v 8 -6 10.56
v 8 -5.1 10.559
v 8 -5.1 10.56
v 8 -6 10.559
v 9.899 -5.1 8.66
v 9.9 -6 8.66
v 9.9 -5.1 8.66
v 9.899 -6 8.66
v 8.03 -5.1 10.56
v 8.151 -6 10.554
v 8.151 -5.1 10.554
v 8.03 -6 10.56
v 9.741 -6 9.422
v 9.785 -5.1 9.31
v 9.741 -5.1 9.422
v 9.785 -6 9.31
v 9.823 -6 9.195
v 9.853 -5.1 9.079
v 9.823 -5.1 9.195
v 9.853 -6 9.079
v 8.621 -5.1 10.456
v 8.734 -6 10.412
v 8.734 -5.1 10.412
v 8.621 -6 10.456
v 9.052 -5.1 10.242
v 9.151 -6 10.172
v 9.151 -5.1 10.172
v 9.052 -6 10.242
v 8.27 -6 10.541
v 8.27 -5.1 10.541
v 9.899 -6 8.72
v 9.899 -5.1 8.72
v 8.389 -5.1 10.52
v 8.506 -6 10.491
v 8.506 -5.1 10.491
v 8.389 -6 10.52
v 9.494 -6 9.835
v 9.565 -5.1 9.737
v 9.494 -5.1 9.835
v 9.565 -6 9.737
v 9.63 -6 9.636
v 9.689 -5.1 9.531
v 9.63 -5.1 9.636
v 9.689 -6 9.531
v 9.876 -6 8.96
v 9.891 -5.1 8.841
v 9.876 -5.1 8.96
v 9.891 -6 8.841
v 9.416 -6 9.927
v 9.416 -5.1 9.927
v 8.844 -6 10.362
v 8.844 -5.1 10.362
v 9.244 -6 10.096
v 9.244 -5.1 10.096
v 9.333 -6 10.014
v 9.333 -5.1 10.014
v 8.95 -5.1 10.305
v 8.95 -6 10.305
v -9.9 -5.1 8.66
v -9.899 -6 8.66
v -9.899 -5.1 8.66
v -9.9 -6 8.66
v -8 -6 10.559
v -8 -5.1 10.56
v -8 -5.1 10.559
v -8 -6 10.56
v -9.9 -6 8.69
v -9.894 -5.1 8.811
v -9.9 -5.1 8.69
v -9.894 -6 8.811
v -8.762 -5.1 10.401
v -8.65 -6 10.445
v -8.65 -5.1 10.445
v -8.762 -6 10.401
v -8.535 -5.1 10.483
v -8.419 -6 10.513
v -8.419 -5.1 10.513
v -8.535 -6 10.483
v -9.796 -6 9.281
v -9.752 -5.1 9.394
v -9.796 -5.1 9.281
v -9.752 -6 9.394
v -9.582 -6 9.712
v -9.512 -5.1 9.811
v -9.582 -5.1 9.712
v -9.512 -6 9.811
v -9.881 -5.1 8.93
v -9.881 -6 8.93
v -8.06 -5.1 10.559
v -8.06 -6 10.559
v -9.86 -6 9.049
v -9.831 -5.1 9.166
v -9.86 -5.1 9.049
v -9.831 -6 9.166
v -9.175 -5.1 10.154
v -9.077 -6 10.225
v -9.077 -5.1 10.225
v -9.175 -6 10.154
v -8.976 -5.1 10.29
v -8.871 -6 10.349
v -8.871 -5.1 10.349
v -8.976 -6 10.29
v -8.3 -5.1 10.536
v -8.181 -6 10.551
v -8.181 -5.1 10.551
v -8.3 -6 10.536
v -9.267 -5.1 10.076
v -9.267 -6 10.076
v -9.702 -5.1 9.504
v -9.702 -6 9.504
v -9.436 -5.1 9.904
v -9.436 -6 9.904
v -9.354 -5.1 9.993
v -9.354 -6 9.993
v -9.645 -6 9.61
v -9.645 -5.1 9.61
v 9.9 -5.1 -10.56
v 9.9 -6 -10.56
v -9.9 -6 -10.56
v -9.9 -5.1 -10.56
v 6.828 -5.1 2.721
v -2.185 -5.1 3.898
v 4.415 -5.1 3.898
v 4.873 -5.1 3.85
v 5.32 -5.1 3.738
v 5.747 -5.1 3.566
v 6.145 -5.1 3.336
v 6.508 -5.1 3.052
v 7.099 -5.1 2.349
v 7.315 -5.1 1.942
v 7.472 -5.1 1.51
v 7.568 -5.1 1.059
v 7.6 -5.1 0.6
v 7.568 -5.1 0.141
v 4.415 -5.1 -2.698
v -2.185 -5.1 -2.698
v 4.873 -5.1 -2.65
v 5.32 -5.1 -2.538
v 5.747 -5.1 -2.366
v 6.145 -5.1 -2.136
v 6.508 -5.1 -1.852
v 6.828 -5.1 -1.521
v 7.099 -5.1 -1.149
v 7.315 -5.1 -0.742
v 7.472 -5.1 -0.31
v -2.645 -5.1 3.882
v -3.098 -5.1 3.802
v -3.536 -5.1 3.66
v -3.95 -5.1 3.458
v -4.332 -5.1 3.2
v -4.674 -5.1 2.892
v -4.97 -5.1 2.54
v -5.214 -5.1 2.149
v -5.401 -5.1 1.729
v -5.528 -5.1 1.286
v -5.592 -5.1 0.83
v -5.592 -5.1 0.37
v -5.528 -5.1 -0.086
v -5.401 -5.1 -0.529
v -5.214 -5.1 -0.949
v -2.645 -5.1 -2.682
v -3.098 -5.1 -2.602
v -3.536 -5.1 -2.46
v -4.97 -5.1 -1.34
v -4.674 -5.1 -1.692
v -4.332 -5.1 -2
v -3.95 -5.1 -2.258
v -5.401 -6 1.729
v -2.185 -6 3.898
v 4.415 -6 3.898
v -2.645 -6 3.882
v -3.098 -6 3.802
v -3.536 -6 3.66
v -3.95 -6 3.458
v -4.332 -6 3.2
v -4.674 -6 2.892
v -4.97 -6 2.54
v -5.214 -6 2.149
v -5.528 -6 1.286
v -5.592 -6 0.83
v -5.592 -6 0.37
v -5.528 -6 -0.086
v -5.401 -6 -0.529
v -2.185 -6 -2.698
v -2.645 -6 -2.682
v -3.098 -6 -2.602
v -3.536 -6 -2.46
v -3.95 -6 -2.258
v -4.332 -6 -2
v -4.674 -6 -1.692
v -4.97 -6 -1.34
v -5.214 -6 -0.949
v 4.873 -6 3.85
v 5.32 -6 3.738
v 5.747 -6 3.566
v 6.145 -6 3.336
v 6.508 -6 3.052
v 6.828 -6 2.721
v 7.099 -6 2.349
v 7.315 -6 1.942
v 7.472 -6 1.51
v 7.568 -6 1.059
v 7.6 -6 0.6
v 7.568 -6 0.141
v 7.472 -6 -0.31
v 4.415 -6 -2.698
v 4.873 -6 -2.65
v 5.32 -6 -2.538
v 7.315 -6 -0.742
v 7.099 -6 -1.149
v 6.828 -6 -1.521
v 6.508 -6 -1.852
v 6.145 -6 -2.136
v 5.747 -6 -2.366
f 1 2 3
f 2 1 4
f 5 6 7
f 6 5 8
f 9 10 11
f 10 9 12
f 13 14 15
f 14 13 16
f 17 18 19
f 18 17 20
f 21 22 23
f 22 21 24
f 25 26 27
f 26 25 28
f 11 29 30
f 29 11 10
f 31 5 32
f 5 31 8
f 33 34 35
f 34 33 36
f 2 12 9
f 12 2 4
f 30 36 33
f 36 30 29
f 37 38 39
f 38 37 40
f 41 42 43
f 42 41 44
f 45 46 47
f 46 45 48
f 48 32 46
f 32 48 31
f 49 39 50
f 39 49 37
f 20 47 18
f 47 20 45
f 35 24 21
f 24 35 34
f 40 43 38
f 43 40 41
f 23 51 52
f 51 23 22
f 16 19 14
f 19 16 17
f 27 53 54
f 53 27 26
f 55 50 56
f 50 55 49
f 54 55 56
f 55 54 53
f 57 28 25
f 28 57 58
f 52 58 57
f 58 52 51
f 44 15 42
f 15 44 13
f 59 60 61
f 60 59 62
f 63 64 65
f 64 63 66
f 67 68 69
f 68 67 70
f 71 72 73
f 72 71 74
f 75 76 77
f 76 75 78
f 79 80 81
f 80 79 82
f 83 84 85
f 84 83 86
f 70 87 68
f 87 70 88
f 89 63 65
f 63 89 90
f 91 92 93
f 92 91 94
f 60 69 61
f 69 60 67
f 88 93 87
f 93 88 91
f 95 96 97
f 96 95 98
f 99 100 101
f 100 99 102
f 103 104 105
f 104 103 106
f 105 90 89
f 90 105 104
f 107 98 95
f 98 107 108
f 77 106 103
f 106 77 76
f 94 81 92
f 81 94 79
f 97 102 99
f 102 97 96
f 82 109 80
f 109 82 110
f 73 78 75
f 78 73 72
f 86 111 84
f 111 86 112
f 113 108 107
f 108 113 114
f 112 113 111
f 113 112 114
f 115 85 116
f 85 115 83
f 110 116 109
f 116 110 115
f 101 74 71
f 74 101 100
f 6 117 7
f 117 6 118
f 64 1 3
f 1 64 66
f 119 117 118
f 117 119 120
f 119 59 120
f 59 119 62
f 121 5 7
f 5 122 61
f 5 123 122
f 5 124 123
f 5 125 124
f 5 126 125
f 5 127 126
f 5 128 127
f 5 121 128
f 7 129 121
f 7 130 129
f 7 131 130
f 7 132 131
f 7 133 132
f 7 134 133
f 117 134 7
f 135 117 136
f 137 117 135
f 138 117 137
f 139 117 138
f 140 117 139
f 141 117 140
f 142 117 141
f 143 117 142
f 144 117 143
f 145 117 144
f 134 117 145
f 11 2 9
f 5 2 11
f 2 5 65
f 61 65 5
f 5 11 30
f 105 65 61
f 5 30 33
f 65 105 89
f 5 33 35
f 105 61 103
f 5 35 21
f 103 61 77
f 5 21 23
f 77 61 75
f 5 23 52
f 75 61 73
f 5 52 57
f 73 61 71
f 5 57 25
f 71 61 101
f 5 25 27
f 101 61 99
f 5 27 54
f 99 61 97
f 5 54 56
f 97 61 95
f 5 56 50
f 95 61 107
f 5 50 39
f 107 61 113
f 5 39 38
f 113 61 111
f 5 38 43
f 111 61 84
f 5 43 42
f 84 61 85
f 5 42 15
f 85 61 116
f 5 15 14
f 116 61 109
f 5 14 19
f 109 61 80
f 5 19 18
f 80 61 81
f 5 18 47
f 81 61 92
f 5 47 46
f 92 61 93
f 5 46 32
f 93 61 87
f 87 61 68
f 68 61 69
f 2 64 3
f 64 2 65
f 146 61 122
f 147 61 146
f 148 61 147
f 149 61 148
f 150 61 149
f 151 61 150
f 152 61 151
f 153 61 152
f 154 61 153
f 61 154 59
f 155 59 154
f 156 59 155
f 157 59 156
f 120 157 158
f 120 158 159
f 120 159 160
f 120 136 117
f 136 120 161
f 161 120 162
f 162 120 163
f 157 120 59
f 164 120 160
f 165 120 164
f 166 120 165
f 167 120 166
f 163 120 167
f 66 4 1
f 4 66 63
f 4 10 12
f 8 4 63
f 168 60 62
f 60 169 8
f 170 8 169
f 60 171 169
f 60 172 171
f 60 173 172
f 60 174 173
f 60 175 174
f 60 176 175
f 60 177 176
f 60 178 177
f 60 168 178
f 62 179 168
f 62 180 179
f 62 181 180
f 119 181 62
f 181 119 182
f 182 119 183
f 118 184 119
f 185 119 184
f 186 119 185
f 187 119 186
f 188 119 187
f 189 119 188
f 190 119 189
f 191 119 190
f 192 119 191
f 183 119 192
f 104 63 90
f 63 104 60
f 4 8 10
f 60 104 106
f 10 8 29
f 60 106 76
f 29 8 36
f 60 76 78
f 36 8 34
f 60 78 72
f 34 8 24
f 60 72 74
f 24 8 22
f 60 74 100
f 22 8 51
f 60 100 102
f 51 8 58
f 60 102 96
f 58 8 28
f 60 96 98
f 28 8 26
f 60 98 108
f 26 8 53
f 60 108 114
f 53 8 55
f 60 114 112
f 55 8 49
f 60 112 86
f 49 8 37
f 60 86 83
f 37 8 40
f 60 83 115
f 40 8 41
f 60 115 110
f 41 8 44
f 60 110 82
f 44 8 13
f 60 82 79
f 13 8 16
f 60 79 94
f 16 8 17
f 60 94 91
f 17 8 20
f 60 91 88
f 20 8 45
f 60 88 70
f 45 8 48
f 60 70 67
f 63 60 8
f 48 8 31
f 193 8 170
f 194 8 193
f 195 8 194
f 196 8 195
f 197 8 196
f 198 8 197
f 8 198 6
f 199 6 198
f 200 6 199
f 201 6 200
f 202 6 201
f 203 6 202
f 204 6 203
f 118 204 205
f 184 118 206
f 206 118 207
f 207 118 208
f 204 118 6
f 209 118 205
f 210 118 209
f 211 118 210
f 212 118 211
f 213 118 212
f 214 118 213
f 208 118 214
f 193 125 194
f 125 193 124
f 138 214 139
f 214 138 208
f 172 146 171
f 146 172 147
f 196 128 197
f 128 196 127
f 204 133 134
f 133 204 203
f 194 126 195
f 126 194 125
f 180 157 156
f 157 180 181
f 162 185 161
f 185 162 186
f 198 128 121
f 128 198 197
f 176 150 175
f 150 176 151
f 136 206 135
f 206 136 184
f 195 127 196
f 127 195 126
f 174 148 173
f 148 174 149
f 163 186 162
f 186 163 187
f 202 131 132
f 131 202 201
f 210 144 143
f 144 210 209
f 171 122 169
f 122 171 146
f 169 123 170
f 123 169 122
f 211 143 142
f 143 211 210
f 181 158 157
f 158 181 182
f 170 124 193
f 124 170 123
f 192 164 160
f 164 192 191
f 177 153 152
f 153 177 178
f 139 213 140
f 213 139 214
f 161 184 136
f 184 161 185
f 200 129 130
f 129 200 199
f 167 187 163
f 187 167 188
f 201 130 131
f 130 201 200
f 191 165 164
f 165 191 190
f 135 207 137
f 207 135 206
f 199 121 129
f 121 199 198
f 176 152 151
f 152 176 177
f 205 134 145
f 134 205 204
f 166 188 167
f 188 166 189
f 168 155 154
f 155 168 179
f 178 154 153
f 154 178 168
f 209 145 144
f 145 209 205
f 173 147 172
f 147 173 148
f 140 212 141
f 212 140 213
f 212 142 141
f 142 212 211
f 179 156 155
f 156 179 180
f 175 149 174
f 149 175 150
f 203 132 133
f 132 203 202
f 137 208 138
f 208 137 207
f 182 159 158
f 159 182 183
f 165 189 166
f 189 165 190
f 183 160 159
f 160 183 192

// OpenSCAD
// file: rounder.scad
// rounder.scad
// cutting tool for rounding off corners with a cylinder

//---------------------
module rounder(
r=10,   // radius
h=10,   // height
f=22,    // $fn
extra=0.01  // extra size for the cube
){

difference(){
  translate([-extra,-extra,-extra])
  cube([r+extra,r+extra,h+2*extra]);
  translate([r,r,-1])
  cylinder(r=r,h=h+2,$fn=f);
}

}

//---------------------------------------------------------------------------
module bevel(x=1,y=1,h=10){

linear_extrude(height=h)
polygon(points=[[0,0],[x,0],[0,y]]);
    
}
  

//========================

rounder();

//========================
// file: tslot.scad
//=================================================================================
// tslot
// models for tslots used in PrusaDusa
// 
// Tom Flint, 2020
//=================================================================================
module tslot1(
tol = 0.0,
len = 60,
type = 1
){
    
// 30x30     
if(type==1){
    linear_extrude(height=len,convexity=10)
    difference(){
        offset(r=2.0+tol,$fn=20)
        square([26,26],center=true);
 
        translate([0,12,0])
        square([8.2-tol,8.2-tol],center=true);
        translate([0,-12,0])
        square([8.2-tol,8.2-tol],center=true);
        translate([12,0,0])
        square([8.2-tol,8.2-tol],center=true);
        translate([-12,0,0])
        square([8.2-tol,8.2-tol],center=true);
    }
}
    
// 30x60
if(type==2){
    linear_extrude(height=len,convexity=10)
    difference(){
        offset(r=2.0+tol,$fn=20)
        square([26,56],center=true);
 
        translate([0,27,0])
        square([8.2-tol,8.2-tol],center=true);
        translate([0,-27,0])
        square([8.2-tol,8.2-tol],center=true);
        
        translate([12,15,0])
        square([8.2-tol,8.2-tol],center=true);
        translate([-12,15,0])
        square([8.2-tol,8.2-tol],center=true);

        translate([12,-15,0])
        square([8.2-tol,8.2-tol],center=true);
        translate([-12,-15,0])
        square([8.2-tol,8.2-tol],center=true);
    }
}
    
// 36x60
if(type==3){
    linear_extrude(height=len,convexity=10)
    difference(){
        offset(r=2.0+tol,$fn=20)
        square([56,56],center=true);
 
        translate([15,27,0])
        square([8.2-tol,8.2-tol],center=true);
        translate([15,-27,0])
        square([8.2-tol,8.2-tol],center=true);
        
        translate([-15,27,0])
        square([8.2-tol,8.2-tol],center=true);
        translate([-15,-27,0])
        square([8.2-tol,8.2-tol],center=true);
        
        translate([27,15,0])
        square([8.2-tol,8.2-tol],center=true);
        translate([-27,15,0])
        square([8.2-tol,8.2-tol],center=true);

        translate([27,-15,0])
        square([8.2-tol,8.2-tol],center=true);
        translate([-27,-15,0])
        square([8.2-tol,8.2-tol],center=true);
    }
}
    
}

//--------------------------------------
module tbrace(
tol=0.0
){

F2=22;
 
translate([0,0,2-15])    
difference(){    
union(){
        cube([4.8,60,26]);
        cube([60,4.8,26]);
    
    hull(){
        translate([60-2.4,4.8,0])
        cylinder(r=2.4,h=26,$fn=F2);
        translate([4.8,60-2.4,0])
        cylinder(r=2.4,h=26,$fn=F2);
    }
}    

        translate([15,0,26/2])
        rotate([-90,0,0])
        cylinder(r1=3.5,r2=4.5,h=60,$fn=F2);
        translate([15+30,0,26/2])
        rotate([-90,0,0])
        cylinder(r1=3.5,r2=4.5,h=60,$fn=F2);

        translate([0,15,26/2])
        rotate([0,90,0])
        cylinder(r1=3.5,r2=4.5,h=60,$fn=F2);
        translate([0,15+30,26/2])
        rotate([0,90,0])
        cylinder(r1=3.5,r2=4.5,h=60,$fn=F2);

}
}

//----------------------------------------
module lbrace(
tol=0,
holes=0,
nuts=1
){

F2=22;
    
pts1=[ [5,0], [80,0], [85,5], [85,22], [80,28],
    [28,28], [28,80], [22,85], [5,85], [0,80], [0,5] ];
    
if(holes==1){
    difference(){
        linear_extrude(height=3.25+tol,convexity=10)
        offset(r=tol)
        polygon(points=pts1);
        
        translate([16+30,14,-1])
        cylinder(r=3.25,h=5,$fn=F2);
        translate([16+60,14,-1])
        cylinder(r=3.25,h=5,$fn=F2);

        translate([14,16+30,-1])
        cylinder(r=3.25,h=5,$fn=F2);
        translate([14,16+60,-1])
        cylinder(r=3.25,h=5,$fn=F2);
    }
}else{
        linear_extrude(height=3.25+tol,convexity=10)
        offset(r=tol)
        polygon(points=pts1);
}

if(nuts==1){
    
        translate([16+30,14,0])
        cylinder(r=5,h=6+3.25,$fn=F2);
        translate([16+60,14,0])
        cylinder(r=5,h=6+3.25,$fn=F2);

        translate([14,16+30,0])
        cylinder(r=5,h=6+3.25,$fn=F2);
        translate([14,16+60,0])
        cylinder(r=5,h=6+3.25,$fn=F2);
}

}


//=======================================

lbrace();

translate([50,50,0])
lbrace(tol=0.2);

//tbrace();

/*
color("cyan")
tslot1(len=70);

color("green")
translate([0,15,0])
tslot1(type=2);

color("red")
translate([15,15,0])
tslot1(type=3,len=50);

*/

//=======================================
// main file
//=================================================================================
// lems.scad
// fixtures for LEM current sensors
//
// Dr Tom Flint, 30 April 2021
// add new LEM cases to allow use of 12 AWG wiring, 18 Nov 2021
//
//=================================================================================


use <../Parts/tslot.scad>
use <../Parts/rounder.scad>


//---------------------------------------------------------------------------------
module lem15(){

difference(){
  cube([13.4,23.7,22.0]);
 
  translate([-0.1,-0.01,-0.01])
  cube([1.1,17,14.5]);  
  translate([12.4,-0.01,-0.01])
  cube([1.1,17,14.5]);

  translate([0,14,11.4])
  rotate([0,90,0])
  cylinder(r=1.6,h=20);
  
  translate([-1,23.7,22.0])
  rotate([0,90,0])
  rotate([0,0,-90])
  rounder(r=1.6,h=20,f=89);
  
  translate([-1,0,22.0])
  rotate([0,90,0])
  rounder(r=1.6,h=20,f=89);
  
}

 $fn=55;
 
 // power pins
 translate([0.5,9.2,-3.75])
 cylinder(r=0.5,h=8.5);
 translate([0.5,11.8,-3.75])
 cylinder(r=0.5,h=8.5);
 translate([0.5,14.2,-3.75])
 cylinder(r=0.5,h=8.5);

 translate([12.9,9.2,-3.75])
 cylinder(r=0.5,h=8.5);
 translate([12.9,11.8,-3.75])
 cylinder(r=0.5,h=8.5);
 translate([12.9,14.2,-3.75])
 cylinder(r=0.5,h=8.5);
 
  // attach the pins to the body
  translate([0,7,0])
  cube([1,8,3]);  
  translate([12.4,7,0])
  cube([1,8,3]);
 
  // signal pins
  for(i=[0:3]){
    translate([4+1.5*i,22.0,-3.75])
    cylinder(r=0.15,h=8.5);
  }
 
}

//-------------------------------------------------------------------------------
module lemPack3(){

rfoot=2;
fit=0.15;

  $fn=89;
  difference(){
  hull(){
    translate([rfoot,rfoot,0])
    cylinder(r1=rfoot,r2=rfoot,h=9);
    translate([rfoot,rfoot+13.4,0])
    cylinder(r1=rfoot,r2=rfoot,h=9);

    translate([rfoot+23.7*3+4,rfoot,0])
    cylinder(r1=rfoot,r2=rfoot,h=9);
    translate([rfoot+23.7*3+4,rfoot+13.4,0])
    cylinder(r1=rfoot,r2=rfoot,h=9);
  }


  for(i=[0:2]){
    translate([3+(23.7+2)*i-fit/2,2-fit/2,1.8]){
    cube([22.0+fit,13.4+fit,20]);
    hull(){
    translate([23.7*0.3,13.4/2,0])
    cylinder(r=4,h=10,center=true);
    translate([23.7*0.7,13.4/2,0])
    cylinder(r=4,h=10,center=true);
  }
    }
  }
}

  difference(){
    translate([10,-21.7-1,0])
    cube([55.2+2,21.7+2,6.8+2]);

    translate([11,-21.7,2.1])
    cube([55.2,21.7,6.8]);
  }
  difference(){
    translate([10,17,0])
    cube([55.2+2,21.7+2,6.8+2]);

    translate([11,17,2.1])
    cube([55.2,21.7,6.8]);
  }

if(0){
  color("red")
  translate([40,1,4])
  rotate([84,0,0])
  linear_extrude(height=1,scale=1)
  text("Aero Amp", font = "Open Sans:style=Bold", size=5.5,halign="center",valign="center",spacing=1.1);
}

}
//-------------------------------
module lemcase3(){

  difference(){
    lemcase(round=0);
    translate([-10-1,8,21.32/2+1])
    rotate([90,0,0])
    rotate([0,0,-90])
    rounder(r=3,h=14.1,f=33);
  }
  translate([21,0,0])
  lemcase(round=0);
  difference(){
    translate([42,0,0])
    lemcase(round=0);
    translate([53,8,21.32/2+1])
    rotate([90,0,0])
    rotate([0,0,180])
    rounder(r=3,h=14.1,f=33);
  }
  
  
if(0){  
  difference(){  
    translate([-11,-5.5,23/2])
    cube([64,12,0.6]);
    
    color("red")
    translate([22,0,23/2])
    linear_extrude(height=0.6,scale=1)
    text("Aero Amp", font = "Open Sans:style=Bold", size=7,halign="center",valign="center",spacing=1.1);
  }
}

}
  
  
//---------------------------------------------------------------------------------
// replacement shell for the LEM15's which don't allow enough space to get a 12 awg 
// wire through the loop
module lemcase(round=1){

thick=1.0;

  // outer body
  difference(){
    translate([0,thick/2,0])
    cube([20.0+2*thick,11+1*thick,21.32+2*thick],center=true);

    if(round==1){
      translate([10+thick,6+thick,21.32/2+thick])
      rotate([90,0,0])
      rotate([0,0,180])
      rounder(r=2+thick,h=14,f=99);

      translate([-10-thick,6+thick,21.32/2+thick])
      rotate([90,0,0])
      rotate([0,0,-90])
      rounder(r=2+thick,h=14,f=99);
    }
    
    // bore for conductor
    translate([1,0,0.6])
    rotate([90,0,0])
    cylinder(r=5/2,h=15,center=true,$fn=45);
    
    // cut for pcb signal wires
    translate([-10,-6-thick/2,-21.32/2-thick-0.1])
    cube([2.8,12,3]);

    difference(){
      // main hole
      cube([20.0,11.1,21.32],center=true);
      translate([10,5,21.32/2])
      rotate([90,0,0])
      rotate([0,0,180])
      rounder(r=2,h=11.1,f=33);
      translate([-10,5,21.32/2])
      rotate([90,0,0])
      rotate([0,0,-90])
      rounder(r=2,h=11.1,f=33);

      // bottom right notches
      translate([10-0.5,0,-21.32/2+1.8])
      cube([1.0,11+2,0.73],center=true);
      translate([10-0.5,0,-21.32/2+1.5+2.2])
      cube([1.0,11+2,0.73],center=true);

      // left side notches
      translate([-10+3.0,0,-21.32/2])
      cube([0.55,11+2,0.45],center=true);
      translate([-10+5.25,0,21.32/2-0.4])
      cube([1.0,11+2,1.0],center=true);
      
      // right side isn't as deep
      translate([-4,3.75+1,-21.32/2])
      cube([14,1,25]);
      
      // bore for conductor
      translate([1,0,0.6])
      rotate([90,0,0])
      cylinder(r=5/2+0.8,h=15,center=true,$fn=45);
    }
  }  
}
//---------------------------------------------------------------------------------
// replacement shell for the LEM15's which don't allow enough space to get a 12 awg 
// wire through the loop
module lemcase2(round=1){

thick=1.0;

  // outer body
  difference(){
    translate([0,thick/2,0])
    cube([20.0+2*thick,12+1*thick,21.32+2*thick],center=true);

    if(round==1){
      translate([10+thick,6+thick,21.32/2+thick])
      rotate([90,0,0])
      rotate([0,0,180])
      rounder(r=2+thick,h=14,f=99);

      translate([-10-thick,6+thick,21.32/2+thick])
      rotate([90,0,0])
      rotate([0,0,-90])
      rounder(r=2+thick,h=14,f=99);
    }
    
    // bore for conductor
    translate([1,0,0.6])
    rotate([90,0,0])
    cylinder(r=5/2,h=15,center=true,$fn=45);
    
    // cut for pcb signal wires
    translate([-10,-6-thick/2,-21.32/2-thick-0.1])
    cube([2.8,12,3]);

    difference(){
      // main hole
      cube([20.0,12.1,21.32],center=true);
      translate([10,5,21.32/2])
      rotate([90,0,0])
      rotate([0,0,180])
      rounder(r=2,h=12.1,f=33);
      translate([-10,5,21.32/2])
      rotate([90,0,0])
      rotate([0,0,-90])
      rounder(r=2,h=12.1,f=33);

      // bottom right notches
      translate([10-0.5,0,-21.32/2+1.8])
      cube([1.0,8+2,0.73],center=true);
      translate([10-0.5,0,-21.32/2+1.5+2.2])
      cube([1.0,8+2,0.73],center=true);

      // left side notches
      translate([-10+3.0,0,-21.32/2])
      cube([0.55,8+2,0.45],center=true);
      translate([-10+5.25,0,21.32/2-0.4])
      cube([1.0,8+2,1.0],center=true);
      
      // right side isn't as deep
      translate([-4,3.75+1,-21.32/2])
      cube([14,1,25]);
      
      // bore for conductor
      translate([1,0,0.6])
      rotate([90,0,0])
      cylinder(r=5/2+0.8,h=15,center=true,$fn=45);
    }
  }  
}

//---------------------------------------------------------------------------------
// replacement shell for the LEM15's which don't allow enough space to get a 12 awg 
// wire through the loop
module lemlid2(round=1){

thick=-0.1;

  // outer body
  translate([0,-5.5,0])
  difference(){
    translate([0,thick/2,0])
    cube([20.0+2*thick,0.9,21.32+2*thick],center=true);

    if(round==1){
      translate([10+thick,6+thick,21.32/2+thick])
      rotate([90,0,0])
      rotate([0,0,180])
      rounder(r=2+thick,h=14,f=99);

      translate([-10-thick,6+thick,21.32/2+thick])
      rotate([90,0,0])
      rotate([0,0,-90])
      rounder(r=2+thick,h=14,f=99);
    }
    
    // bore for conductor
    translate([1,0,0.6])
    rotate([90,0,0])
    cylinder(r=5/2+1,h=15,center=true,$fn=45);
    
    // cut for pcb signal wires
    translate([-10,-6-thick/2,-21.32/2-thick-0.1])
    cube([2.8,12,3]);

  }  
}

//---------------------------------------------------------------------------------
// replacement shell for the LEM15's which don't allow enough space to get a 12 awg 
// wire through the loop
module lemcase4(round=1){

thick=1.0;

  // outer body
  difference(){
    translate([0,thick/2-0.5,0])
    cube([20.0+2*thick,12+1*thick+1,21.32+2*thick],center=true);

    if(round==1){
      translate([10+thick,6+thick,21.32/2+thick])
      rotate([90,0,0])
      rotate([0,0,180])
      rounder(r=2+thick,h=14,f=99);

      translate([-10-thick,6+thick,21.32/2+thick])
      rotate([90,0,0])
      rotate([0,0,-90])
      rounder(r=2+thick,h=14,f=99);
    }
    
    // bore for conductor
    hull(){
      translate([1+3.3,0,0.6])
      rotate([90,0,0])
      cylinder(r=5/2,h=15,center=true,$fn=45);
      translate([1-3.3,0,0.6])
      rotate([90,0,0])
      cylinder(r=5/2,h=15,center=true,$fn=45);
    }
    
    // cut for pcb signal wires
    translate([-10,-6-thick/2-0.5,-21.32/2-thick-0.1])
    cube([2.8,12+1,3]);

    difference(){
      // main hole
      translate([0,-0.5,0])
      cube([20.0,12.1+1,21.32],center=true);
      
      // top rounders
      translate([10,6,21.32/2])
      rotate([90,0,0])
      rotate([0,0,180])
      rounder(r=2,h=12.1+1,f=33);
      translate([-10,6,21.32/2])
      rotate([90,0,0])
      rotate([0,0,-90])
      rounder(r=2,h=12.1+1,f=33);

      // bottom right notches
      translate([10-0.5,0,-21.32/2+1.8])
      cube([1.0,8+3+1,0.73],center=true);
      translate([10-0.5,0,-21.32/2+1.5+2.2])
      cube([1.0,8+3+1,0.73],center=true);

      // left side notches
      translate([-10+3.0+3.5,0,-21.32/2])
      cube([0.73,8+3+1,1],center=true);
      translate([-10+5.5,0,21.32/2-0.4])
      cube([1.0,8+3+1,1.0],center=true);
      
      // right side isn't as deep
      translate([-4,3.75+1.5,-21.32/2])
      cube([14,1,25]);
      
      // bore for conductor
      hull(){
        translate([1+3.3,0,0.6])
        rotate([90,0,0])
        cylinder(r=5/2+0.6,h=15,center=true,$fn=45);
        translate([1-3.3,0,0.6])
        rotate([90,0,0])
        cylinder(r=5/2+0.6,h=15,center=true,$fn=45);
      }
    }
  }  
  
  // add strain relief 4-wire ribbon cable, 6x1.2 
  translate([-3,0,0]){
    difference(){
      translate([4,1.5,-(20.0+3*thick)/2])
      cube([6,12+1*thick+1-3,4.5],center=true);
    
      translate([0,thick/2-0.5,0])
      cube([20.0+2*thick,12+1*thick+1,21.32+2*thick],center=true);

      translate([0,thick/2-0.5-3,-(21.32+2*thick)/2-0.5])
      cube([20.0+2*thick,12+1*thick+1,1.2],center=true);
      
    }

    translate([2,thick+0.5,-(21.32+2*thick)/2-2.1])
    rotate([90,0,0])
    cylinder(r=thick,h=12+1*thick+1-3,center=true,$fn=77);
    translate([6,thick+0.5,-(21.32+2*thick)/2-2.1])
    rotate([90,0,0])
    cylinder(r=thick,h=12+1*thick+1-3,center=true,$fn=77);
  }
}

//---------------------------------------------------------------------------------
// replacement shell for the LEM15's which don't allow enough space to get a 12 awg 
// wire through the loop
module lemlid4(round=1){

thick=-0.1;

  // outer body
  translate([0,-5.5,0])
  difference(){
    translate([0,thick/2,0])
    cube([20.0+2*thick,0.9,21.32+2*thick],center=true);

    if(round==1){
      translate([10+thick,6+thick,21.32/2+thick])
      rotate([90,0,0])
      rotate([0,0,180])
      rounder(r=2+thick,h=14,f=99);

      translate([-10-thick,6+thick,21.32/2+thick])
      rotate([90,0,0])
      rotate([0,0,-90])
      rounder(r=2+thick,h=14,f=99);
    }
    
    // bore for conductor
    hull(){
      translate([1+3.3,0,0.6])
      rotate([90,0,0])
      cylinder(r=5/2+0.8,h=15,center=true,$fn=45);
      translate([1-3.3,0,0.6])
      rotate([90,0,0])
      cylinder(r=5/2+0.8,h=15,center=true,$fn=45);
    }

  }  
}

//=================================================================================

//color("red",alpha=0.7)
//lemcase();

//color("red")
//lemcase4();
//translate([0,-1,0])
lemlid4();

//lemcase3();

//lemPack3();


if(0){
color("gray")  
for(i=[0:2]){
  translate([2+(23.7+2)*i,2,2]){

    translate([0,0,22.0])
    rotate([180,0,90])
    lem15();
  }
}
}



//=================================================================================
 
